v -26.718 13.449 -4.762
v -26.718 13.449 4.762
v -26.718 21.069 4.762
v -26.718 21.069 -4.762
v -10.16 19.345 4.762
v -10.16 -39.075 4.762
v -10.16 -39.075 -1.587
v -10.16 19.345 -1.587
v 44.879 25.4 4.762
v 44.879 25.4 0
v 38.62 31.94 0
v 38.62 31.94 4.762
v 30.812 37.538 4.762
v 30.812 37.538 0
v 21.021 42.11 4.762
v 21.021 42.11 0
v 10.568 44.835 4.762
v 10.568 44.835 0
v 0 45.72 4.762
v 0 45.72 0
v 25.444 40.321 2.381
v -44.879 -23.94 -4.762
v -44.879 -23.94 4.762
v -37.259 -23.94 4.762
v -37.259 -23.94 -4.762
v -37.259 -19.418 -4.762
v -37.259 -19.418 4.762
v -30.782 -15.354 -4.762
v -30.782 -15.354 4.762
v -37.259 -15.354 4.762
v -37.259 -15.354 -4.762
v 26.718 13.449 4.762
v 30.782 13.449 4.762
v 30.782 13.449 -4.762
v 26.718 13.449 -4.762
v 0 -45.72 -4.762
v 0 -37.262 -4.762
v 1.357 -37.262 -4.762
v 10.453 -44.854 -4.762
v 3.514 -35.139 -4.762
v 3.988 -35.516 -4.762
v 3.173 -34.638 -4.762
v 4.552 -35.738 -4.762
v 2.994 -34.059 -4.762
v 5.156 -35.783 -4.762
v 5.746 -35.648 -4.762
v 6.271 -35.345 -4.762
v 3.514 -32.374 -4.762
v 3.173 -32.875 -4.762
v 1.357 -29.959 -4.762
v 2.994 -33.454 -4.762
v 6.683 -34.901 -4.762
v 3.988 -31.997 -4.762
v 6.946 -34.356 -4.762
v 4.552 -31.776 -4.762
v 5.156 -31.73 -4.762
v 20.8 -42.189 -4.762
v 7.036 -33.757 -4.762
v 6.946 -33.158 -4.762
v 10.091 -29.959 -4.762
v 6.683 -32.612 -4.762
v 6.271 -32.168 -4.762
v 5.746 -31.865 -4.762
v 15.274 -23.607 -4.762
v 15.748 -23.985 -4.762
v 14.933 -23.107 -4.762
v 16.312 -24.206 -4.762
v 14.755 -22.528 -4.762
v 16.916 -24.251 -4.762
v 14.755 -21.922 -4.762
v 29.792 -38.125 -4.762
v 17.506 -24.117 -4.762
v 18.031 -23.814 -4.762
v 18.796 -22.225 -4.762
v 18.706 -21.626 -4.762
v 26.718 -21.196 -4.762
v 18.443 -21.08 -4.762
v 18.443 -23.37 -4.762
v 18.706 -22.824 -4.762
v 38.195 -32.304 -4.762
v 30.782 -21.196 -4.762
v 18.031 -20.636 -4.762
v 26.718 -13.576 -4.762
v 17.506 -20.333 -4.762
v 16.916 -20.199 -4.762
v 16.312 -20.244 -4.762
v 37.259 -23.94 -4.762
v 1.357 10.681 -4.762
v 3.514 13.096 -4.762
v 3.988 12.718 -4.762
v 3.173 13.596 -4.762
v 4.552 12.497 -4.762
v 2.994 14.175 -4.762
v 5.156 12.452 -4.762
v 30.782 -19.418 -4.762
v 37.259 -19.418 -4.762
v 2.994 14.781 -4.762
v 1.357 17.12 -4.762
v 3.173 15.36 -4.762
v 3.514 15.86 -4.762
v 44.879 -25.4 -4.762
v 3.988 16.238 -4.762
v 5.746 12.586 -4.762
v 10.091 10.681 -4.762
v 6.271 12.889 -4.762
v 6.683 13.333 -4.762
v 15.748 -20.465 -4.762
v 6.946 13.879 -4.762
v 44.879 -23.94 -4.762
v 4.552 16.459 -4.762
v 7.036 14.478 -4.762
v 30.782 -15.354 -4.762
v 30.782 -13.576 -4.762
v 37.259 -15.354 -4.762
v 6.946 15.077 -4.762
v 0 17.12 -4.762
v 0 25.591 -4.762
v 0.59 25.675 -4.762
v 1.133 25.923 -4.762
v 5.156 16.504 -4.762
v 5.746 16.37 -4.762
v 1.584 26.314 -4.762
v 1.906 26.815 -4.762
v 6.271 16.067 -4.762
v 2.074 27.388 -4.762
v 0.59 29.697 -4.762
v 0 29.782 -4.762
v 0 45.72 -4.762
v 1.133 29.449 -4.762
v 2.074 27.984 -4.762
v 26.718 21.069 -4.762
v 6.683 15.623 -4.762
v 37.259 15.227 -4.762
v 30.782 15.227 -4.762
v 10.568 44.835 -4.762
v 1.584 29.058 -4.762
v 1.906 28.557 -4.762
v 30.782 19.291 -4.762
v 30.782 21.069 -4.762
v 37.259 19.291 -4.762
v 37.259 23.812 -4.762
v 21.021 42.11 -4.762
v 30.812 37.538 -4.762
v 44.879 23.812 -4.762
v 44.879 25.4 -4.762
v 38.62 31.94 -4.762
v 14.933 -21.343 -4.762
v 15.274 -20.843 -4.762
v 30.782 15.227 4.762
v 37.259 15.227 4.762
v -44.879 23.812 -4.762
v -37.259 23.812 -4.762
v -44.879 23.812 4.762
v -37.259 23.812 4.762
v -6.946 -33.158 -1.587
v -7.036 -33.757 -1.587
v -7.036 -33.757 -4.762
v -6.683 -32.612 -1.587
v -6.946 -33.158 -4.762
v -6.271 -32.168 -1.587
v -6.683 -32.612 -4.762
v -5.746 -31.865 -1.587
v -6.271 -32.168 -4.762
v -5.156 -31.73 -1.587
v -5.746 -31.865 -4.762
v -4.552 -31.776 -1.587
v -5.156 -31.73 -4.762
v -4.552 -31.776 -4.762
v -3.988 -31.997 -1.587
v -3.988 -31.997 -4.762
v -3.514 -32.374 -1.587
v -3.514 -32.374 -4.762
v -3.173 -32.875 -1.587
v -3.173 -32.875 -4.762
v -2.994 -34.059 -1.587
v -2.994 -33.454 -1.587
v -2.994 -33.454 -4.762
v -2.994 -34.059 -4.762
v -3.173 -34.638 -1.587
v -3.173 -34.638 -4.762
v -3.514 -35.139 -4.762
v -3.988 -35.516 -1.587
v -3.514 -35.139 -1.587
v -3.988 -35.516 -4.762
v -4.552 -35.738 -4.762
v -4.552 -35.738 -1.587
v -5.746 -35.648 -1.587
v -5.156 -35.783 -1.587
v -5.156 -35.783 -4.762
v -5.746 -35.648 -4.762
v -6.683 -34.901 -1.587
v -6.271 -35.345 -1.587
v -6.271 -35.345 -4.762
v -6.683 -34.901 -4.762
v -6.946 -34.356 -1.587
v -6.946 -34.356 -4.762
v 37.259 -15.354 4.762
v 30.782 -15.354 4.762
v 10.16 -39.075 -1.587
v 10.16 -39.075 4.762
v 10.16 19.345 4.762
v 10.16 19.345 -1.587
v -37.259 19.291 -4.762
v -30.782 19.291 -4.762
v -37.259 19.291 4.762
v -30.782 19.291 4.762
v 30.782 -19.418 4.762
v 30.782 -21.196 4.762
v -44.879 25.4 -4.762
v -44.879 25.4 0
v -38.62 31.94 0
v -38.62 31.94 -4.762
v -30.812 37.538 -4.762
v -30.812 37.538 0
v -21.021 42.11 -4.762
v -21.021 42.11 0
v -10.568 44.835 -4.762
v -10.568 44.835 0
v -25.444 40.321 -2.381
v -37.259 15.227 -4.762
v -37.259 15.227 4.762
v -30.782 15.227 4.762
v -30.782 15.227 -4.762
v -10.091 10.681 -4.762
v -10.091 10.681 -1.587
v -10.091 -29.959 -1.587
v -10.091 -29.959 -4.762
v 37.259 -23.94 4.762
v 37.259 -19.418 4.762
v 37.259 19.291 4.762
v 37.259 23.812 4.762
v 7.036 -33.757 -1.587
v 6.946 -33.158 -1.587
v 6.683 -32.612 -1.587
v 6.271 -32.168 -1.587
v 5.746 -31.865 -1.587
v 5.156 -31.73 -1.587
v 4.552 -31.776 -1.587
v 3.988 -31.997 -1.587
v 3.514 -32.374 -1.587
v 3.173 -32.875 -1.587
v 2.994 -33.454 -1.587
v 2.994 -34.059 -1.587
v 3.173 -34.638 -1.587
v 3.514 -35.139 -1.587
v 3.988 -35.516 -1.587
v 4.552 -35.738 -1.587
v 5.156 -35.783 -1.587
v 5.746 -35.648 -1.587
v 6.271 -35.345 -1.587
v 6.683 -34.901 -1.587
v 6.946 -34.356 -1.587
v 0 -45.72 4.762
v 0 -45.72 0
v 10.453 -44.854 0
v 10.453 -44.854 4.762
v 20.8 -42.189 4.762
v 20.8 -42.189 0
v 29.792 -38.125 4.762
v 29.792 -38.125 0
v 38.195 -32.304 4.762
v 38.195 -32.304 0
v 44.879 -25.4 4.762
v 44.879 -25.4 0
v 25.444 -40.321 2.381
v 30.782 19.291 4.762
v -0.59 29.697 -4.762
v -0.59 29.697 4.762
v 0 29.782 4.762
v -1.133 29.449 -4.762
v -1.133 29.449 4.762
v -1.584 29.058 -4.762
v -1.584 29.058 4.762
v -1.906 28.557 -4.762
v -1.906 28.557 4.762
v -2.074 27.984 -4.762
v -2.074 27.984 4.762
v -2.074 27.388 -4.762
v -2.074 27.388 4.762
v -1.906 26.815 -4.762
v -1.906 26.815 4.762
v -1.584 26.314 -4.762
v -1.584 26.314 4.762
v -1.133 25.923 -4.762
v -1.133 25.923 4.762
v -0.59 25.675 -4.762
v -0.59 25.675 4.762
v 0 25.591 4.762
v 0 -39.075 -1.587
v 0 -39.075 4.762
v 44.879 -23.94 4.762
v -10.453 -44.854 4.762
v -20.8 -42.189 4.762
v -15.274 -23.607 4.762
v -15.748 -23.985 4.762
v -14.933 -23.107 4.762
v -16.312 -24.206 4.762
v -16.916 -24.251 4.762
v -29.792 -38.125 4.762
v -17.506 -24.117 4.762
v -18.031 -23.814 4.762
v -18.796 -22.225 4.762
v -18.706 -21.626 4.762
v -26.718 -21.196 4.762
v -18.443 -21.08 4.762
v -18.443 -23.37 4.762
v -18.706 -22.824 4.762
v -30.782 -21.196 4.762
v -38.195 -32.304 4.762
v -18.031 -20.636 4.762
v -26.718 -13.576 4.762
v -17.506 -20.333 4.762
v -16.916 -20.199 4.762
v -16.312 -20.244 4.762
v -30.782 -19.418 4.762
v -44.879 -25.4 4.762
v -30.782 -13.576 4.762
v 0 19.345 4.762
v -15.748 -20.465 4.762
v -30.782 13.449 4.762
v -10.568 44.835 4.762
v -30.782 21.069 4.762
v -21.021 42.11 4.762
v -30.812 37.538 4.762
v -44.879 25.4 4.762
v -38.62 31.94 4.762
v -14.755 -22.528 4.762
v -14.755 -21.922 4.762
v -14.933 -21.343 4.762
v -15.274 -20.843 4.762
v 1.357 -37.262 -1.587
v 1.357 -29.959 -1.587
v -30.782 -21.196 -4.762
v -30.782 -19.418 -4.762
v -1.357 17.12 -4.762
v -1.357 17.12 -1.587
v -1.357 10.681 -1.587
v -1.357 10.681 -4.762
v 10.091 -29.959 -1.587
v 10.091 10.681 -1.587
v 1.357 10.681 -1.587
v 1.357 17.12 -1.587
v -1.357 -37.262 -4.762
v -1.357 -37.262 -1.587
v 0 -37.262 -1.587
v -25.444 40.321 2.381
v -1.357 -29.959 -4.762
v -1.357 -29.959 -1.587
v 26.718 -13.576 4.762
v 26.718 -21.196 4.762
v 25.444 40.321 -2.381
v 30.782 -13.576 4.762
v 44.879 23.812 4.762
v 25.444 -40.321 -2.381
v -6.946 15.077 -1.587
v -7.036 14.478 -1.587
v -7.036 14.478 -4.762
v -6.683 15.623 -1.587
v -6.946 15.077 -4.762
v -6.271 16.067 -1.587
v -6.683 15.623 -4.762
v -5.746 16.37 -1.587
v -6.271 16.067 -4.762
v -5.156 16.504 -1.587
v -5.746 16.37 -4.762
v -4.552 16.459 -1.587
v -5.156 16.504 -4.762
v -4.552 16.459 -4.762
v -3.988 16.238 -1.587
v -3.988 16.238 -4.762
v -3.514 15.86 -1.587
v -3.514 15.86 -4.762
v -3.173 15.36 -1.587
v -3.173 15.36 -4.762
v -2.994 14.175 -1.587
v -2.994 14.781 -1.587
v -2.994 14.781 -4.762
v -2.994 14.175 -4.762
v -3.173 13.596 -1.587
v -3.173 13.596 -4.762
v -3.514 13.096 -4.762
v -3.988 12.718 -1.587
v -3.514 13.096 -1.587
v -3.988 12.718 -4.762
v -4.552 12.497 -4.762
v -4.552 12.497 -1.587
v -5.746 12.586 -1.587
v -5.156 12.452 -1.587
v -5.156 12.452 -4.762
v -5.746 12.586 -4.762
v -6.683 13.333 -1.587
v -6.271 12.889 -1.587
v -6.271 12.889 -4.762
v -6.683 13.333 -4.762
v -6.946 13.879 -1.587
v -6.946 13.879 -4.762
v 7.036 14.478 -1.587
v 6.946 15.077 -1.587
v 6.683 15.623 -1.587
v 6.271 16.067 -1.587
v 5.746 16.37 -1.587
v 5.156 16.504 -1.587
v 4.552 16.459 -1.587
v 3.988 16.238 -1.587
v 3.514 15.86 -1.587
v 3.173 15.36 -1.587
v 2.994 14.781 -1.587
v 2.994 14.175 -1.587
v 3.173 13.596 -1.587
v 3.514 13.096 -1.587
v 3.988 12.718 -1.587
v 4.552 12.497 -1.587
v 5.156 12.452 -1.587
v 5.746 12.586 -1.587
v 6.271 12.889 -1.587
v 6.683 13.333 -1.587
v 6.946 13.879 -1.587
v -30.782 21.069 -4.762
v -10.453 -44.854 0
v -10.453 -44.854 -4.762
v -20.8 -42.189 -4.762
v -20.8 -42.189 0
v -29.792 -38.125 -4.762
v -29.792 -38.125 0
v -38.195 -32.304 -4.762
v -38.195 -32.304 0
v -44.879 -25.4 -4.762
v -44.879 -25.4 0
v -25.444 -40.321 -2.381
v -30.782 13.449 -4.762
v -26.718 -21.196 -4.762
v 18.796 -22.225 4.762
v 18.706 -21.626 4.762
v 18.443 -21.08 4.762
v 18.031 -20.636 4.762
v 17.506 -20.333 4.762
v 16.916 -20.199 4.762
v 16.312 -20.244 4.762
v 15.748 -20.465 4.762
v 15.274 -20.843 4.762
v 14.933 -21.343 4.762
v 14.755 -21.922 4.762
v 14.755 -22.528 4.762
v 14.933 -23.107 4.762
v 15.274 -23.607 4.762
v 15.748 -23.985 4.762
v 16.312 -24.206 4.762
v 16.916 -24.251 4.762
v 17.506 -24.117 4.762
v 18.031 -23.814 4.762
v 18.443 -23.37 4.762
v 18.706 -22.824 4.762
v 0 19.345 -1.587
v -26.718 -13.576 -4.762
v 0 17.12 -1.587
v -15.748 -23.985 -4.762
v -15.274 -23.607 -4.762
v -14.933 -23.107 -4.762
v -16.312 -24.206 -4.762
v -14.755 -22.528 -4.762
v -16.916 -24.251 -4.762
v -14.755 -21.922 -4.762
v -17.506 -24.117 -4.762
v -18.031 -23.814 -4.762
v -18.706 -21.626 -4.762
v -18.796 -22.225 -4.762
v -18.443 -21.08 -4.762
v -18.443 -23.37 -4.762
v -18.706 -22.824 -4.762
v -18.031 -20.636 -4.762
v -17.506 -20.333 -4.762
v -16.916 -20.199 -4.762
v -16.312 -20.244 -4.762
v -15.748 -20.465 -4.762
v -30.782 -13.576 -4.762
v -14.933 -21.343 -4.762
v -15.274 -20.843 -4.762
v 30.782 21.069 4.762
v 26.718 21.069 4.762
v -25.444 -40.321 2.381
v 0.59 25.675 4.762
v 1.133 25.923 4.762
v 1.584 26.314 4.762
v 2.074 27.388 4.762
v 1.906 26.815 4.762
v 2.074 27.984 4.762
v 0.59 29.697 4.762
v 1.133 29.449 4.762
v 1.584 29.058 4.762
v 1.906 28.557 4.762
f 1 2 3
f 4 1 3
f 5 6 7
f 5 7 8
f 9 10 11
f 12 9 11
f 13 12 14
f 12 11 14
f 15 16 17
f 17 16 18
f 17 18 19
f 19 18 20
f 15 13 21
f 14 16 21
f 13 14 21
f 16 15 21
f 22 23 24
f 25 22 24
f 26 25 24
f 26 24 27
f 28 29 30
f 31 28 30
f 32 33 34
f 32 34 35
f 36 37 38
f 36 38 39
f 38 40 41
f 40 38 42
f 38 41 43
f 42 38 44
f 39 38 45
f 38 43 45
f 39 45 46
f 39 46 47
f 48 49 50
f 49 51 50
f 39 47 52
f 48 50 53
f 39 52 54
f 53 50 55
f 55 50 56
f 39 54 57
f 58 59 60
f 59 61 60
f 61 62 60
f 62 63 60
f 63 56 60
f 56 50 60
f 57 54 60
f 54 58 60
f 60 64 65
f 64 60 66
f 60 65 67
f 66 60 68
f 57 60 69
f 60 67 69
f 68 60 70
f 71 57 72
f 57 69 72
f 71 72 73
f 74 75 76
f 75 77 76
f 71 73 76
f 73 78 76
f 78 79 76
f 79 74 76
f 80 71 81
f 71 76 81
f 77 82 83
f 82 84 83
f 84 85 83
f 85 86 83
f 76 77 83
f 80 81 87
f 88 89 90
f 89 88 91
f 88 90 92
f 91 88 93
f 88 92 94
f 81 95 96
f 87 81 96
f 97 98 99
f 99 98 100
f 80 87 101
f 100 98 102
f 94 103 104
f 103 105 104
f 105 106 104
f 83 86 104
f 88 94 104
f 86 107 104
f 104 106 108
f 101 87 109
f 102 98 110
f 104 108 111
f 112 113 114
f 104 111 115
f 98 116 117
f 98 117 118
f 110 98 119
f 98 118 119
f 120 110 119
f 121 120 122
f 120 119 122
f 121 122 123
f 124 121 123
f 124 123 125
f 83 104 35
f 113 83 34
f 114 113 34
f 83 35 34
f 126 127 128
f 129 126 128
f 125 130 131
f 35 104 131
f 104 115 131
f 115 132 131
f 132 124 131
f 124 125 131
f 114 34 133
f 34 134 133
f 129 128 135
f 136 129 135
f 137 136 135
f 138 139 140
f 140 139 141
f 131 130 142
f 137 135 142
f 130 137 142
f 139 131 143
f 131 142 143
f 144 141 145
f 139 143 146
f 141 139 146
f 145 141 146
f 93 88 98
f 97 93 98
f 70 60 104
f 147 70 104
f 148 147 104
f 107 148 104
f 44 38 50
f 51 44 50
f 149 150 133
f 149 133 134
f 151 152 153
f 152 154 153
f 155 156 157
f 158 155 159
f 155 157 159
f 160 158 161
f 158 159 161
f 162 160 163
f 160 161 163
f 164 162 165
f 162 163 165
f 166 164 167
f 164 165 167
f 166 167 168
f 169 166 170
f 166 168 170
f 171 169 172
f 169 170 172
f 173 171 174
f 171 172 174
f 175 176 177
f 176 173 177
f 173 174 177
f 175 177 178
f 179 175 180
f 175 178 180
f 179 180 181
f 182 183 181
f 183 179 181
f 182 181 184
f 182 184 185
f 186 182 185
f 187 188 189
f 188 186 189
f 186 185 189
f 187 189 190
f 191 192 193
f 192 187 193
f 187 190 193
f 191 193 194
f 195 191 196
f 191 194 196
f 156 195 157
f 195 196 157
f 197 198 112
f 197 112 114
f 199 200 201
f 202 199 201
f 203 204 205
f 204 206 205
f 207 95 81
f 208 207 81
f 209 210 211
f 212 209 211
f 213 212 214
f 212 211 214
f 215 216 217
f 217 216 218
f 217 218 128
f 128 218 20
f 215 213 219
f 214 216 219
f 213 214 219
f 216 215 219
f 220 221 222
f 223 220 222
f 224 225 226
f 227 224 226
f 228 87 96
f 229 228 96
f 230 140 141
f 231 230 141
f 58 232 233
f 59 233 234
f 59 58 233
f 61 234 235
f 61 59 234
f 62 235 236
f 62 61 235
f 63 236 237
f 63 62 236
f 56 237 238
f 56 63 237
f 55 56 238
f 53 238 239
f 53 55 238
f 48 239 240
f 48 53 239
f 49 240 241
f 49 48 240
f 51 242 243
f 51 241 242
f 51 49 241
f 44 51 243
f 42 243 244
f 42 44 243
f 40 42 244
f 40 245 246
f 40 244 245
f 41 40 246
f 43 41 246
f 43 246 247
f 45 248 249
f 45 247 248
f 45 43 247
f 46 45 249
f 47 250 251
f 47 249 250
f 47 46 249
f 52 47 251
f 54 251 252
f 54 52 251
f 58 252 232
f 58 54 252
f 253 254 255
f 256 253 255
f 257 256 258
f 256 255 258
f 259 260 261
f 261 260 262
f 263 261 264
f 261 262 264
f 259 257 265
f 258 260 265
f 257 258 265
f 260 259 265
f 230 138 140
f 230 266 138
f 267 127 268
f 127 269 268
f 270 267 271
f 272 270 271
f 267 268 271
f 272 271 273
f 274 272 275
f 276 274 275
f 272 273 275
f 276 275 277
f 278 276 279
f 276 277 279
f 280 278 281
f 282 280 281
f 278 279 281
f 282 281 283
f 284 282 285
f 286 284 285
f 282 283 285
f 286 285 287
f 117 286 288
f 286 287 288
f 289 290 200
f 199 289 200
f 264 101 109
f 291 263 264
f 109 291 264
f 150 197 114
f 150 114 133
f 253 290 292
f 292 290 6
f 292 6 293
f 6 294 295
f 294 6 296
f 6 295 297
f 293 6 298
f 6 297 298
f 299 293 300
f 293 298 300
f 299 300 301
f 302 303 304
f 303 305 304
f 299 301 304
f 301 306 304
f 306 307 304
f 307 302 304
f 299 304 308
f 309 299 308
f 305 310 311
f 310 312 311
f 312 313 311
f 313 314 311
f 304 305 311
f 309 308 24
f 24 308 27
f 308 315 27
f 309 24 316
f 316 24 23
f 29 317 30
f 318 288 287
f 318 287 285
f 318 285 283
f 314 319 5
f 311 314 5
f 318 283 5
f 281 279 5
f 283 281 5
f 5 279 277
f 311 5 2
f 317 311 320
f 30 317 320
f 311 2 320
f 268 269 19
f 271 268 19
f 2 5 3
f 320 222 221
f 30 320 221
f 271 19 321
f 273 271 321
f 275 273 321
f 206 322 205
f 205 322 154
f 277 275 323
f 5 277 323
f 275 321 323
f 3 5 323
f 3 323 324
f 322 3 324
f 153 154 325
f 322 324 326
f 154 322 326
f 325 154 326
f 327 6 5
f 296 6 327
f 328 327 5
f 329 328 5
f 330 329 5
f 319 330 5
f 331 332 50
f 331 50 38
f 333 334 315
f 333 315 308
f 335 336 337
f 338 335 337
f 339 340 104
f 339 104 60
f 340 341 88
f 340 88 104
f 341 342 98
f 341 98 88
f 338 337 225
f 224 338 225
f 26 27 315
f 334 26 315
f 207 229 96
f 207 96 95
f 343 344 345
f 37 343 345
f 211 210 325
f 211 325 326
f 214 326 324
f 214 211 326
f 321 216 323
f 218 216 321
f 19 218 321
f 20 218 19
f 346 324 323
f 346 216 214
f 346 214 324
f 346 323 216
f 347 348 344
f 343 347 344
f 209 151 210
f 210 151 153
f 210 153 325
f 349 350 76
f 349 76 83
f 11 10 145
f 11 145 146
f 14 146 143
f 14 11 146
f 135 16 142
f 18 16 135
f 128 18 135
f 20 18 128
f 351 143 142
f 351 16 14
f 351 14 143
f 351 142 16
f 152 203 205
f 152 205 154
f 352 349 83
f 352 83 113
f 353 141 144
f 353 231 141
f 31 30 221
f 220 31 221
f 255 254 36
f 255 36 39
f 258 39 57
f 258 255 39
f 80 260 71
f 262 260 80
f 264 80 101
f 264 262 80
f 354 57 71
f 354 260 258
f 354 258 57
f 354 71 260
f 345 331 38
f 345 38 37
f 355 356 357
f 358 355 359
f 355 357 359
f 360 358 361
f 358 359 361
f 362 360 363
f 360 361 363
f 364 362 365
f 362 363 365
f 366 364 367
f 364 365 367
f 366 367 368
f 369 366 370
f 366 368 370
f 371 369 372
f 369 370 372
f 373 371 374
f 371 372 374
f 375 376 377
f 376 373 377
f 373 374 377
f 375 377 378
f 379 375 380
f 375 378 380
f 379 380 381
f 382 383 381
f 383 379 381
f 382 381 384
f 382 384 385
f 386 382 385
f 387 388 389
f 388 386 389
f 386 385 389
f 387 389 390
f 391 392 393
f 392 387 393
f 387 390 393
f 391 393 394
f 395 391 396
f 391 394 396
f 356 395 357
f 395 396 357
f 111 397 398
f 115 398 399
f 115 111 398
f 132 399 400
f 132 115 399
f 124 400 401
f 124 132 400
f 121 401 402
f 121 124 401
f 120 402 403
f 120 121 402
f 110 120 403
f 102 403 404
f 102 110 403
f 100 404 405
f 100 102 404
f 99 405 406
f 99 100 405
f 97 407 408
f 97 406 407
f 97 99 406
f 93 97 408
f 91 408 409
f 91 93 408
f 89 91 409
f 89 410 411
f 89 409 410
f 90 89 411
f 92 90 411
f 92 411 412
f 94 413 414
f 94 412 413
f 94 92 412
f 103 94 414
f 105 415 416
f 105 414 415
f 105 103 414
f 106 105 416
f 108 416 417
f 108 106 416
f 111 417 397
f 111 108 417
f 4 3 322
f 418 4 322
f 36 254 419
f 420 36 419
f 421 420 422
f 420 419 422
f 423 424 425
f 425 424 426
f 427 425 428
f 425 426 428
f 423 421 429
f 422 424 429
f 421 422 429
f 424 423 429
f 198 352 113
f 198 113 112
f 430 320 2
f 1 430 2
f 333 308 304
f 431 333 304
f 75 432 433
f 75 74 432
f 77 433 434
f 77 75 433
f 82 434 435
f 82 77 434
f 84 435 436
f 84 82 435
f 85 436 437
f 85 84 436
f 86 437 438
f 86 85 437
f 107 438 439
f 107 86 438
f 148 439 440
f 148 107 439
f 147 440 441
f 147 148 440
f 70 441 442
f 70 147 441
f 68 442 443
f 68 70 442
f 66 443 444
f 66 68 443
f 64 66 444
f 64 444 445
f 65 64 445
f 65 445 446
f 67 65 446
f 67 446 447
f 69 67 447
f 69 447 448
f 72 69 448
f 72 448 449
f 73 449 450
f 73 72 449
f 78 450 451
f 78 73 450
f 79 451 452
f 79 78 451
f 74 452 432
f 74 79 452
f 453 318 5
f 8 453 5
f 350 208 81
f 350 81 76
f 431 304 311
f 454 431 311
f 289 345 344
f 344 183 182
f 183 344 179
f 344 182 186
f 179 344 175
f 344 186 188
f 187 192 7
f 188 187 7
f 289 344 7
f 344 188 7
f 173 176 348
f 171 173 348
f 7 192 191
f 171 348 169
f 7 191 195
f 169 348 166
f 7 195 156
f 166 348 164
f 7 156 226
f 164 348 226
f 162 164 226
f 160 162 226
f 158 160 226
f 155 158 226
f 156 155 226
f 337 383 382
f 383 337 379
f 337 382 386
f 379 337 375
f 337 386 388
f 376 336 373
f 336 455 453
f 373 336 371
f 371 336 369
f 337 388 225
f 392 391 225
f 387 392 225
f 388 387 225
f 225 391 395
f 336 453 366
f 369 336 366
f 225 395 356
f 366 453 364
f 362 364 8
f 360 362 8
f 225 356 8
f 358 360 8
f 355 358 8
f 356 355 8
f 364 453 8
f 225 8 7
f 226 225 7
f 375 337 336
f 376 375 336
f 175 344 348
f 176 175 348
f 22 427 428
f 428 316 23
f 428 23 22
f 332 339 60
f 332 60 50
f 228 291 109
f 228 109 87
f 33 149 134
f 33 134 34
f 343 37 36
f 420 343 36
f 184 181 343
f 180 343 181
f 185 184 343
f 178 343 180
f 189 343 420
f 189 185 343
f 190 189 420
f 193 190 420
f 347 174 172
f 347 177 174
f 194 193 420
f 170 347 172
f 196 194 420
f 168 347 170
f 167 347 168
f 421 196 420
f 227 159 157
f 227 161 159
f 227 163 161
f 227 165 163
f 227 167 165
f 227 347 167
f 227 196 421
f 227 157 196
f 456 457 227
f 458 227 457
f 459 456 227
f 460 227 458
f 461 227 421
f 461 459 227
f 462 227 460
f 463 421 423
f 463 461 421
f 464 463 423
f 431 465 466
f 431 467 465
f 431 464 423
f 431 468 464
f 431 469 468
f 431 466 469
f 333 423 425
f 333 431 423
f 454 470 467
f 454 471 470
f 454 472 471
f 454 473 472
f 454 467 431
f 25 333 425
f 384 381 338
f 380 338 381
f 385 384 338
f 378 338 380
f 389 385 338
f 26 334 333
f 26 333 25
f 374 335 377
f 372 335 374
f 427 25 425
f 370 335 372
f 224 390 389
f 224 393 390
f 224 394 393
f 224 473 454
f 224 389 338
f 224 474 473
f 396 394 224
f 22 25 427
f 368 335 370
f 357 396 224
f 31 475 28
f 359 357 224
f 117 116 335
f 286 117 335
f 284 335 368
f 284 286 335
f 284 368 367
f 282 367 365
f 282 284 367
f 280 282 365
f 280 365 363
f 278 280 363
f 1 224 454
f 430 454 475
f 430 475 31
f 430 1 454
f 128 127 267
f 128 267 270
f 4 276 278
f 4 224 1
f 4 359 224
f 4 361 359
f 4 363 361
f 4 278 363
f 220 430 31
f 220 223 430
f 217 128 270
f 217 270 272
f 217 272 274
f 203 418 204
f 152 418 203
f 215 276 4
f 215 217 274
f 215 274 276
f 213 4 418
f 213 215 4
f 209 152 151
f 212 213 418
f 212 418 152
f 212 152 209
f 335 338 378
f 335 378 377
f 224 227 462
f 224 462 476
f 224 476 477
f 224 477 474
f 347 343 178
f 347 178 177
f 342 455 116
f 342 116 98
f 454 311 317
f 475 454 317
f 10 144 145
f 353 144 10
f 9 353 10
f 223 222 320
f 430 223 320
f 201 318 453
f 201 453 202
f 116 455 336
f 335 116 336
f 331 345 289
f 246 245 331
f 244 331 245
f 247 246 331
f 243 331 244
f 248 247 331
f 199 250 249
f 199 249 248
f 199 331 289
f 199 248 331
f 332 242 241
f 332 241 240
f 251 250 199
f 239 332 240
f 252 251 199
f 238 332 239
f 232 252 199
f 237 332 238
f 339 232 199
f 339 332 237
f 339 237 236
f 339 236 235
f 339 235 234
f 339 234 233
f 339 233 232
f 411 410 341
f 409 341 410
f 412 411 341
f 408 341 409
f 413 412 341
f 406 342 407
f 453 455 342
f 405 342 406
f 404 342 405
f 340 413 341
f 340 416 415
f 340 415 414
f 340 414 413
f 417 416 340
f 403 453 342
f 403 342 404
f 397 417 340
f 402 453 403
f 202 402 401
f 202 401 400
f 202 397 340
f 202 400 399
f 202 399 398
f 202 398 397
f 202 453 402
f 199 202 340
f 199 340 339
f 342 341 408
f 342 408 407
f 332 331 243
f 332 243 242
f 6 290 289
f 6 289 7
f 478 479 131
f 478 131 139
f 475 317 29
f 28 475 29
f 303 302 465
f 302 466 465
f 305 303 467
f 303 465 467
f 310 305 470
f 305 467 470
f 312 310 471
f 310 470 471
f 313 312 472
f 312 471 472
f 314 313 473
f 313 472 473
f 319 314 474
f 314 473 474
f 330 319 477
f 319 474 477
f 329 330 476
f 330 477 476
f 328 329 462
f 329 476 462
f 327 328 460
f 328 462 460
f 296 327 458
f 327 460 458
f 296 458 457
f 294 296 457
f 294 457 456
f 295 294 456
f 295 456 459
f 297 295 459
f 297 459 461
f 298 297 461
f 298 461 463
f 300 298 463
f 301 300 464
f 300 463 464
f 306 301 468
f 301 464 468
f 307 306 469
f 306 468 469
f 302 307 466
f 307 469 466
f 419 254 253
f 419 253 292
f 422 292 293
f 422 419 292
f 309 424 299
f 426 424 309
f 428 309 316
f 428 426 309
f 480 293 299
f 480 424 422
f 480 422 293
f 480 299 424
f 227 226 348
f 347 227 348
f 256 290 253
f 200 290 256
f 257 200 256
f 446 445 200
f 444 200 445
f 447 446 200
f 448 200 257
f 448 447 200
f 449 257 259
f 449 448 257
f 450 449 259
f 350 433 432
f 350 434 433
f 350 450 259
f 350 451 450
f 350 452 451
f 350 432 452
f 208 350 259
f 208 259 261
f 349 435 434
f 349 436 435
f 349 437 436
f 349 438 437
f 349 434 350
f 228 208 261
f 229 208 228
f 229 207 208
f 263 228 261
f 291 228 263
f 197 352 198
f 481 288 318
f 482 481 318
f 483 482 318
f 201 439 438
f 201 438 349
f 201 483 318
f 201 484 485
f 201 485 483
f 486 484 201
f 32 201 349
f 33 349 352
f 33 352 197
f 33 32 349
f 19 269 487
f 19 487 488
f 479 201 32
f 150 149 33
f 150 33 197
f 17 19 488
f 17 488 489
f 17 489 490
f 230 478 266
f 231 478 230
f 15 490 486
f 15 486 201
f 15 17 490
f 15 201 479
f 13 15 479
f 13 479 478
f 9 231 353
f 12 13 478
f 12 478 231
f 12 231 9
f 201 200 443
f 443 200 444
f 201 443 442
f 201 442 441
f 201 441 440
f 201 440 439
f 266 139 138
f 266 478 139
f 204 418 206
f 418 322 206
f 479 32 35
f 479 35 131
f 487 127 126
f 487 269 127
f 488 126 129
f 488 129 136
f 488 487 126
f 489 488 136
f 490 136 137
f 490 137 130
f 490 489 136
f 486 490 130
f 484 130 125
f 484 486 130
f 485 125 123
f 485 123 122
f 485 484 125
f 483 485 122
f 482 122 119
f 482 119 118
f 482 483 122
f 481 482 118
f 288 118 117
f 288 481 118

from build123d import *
from build123d import SkipClean  # not in build123d's __all__

# Parameters (mm, degrees)
F0_R     = 2.032
F1_DEPTH = 4.7625
F2_W     = 10.16
F2_H     = 58.42
F3_DEPTH = 6.35


with BuildPart() as f1:
    # F0 (on Top) → F1 (new body, symmetric)
    with BuildSketch(Plane.XY):
        with BuildLine():
            Line((0, -37.2616276145), (0, -45.72))
            add(Edge.make_bspline(
                [(0, -45.72), (28.8508510644, -45.72), (44.8791016558, -25.4)],
                knots=[1.5707963268, 1.5707963268, 1.5707963268, 2.5525616834, 2.5525616834, 2.5525616834], degree=2, weights=[1, 0.8819171037, 1]))
            Line((44.8791016558, -25.4), (44.8791016558, -23.9395))
            Line((44.8791016558, -23.9395), (37.2591016558, -23.9395))
            Line((37.2591016558, -23.9395), (37.2591016558, -19.4183))
            Line((37.2591016558, -19.4183), (30.7821016558, -19.4183))
            Line((30.7821016558, -19.4183), (30.7821016558, -21.1963))
            Line((30.7821016558, -21.1963), (26.7181016558, -21.1963))
            Line((26.7181016558, -21.1963), (26.7181016558, -13.5763))
            Line((26.7181016558, -13.5763), (30.7821016558, -13.5763))
            Line((30.7821016558, -13.5763), (30.7821016558, -15.3543))
            Line((30.7821016558, -15.3543), (37.2591016558, -15.3543))
            Line((37.2591016558, -15.3543), (37.2591016558, 15.2273))
            Line((37.2591016558, 15.2273), (30.7821016558, 15.2273))
            Line((30.7821016558, 15.2273), (30.7821016558, 13.4493))
            Line((30.7821016558, 13.4493), (26.7181016558, 13.4493))
            Line((26.7181016558, 13.4493), (26.7181016558, 21.0693))
            Line((26.7181016558, 21.0693), (30.7821016558, 21.0693))
            Line((30.7821016558, 21.0693), (30.7821016558, 19.2913))
            Line((30.7821016558, 19.2913), (37.2591016558, 19.2913))
            Line((37.2591016558, 19.2913), (37.2591016558, 23.8125))
            Line((37.2591016558, 23.8125), (44.8791016558, 23.8125))
            Line((44.8791016558, 23.8125), (44.8791016558, 25.4))
            add(Edge.make_bspline(
                [(44.8791016558, 25.4), (28.8508510644, 45.72), (0, 45.72)],
                knots=[3.7306236238, 3.7306236238, 3.7306236238, 4.7123889804, 4.7123889804, 4.7123889804], degree=2, weights=[1, 0.8819171037, 1]))
            Line((0, 45.72), (0, 29.7815))
            ThreePointArc((0, 29.7815), (2.0955, 27.686), (0, 25.5905))
            Line((0, 25.5905), (0, 17.1200428158))
            Line((0, 17.1200428158), (1.3565140544, 17.1200428158))
            Line((1.3565140544, 17.1200428158), (1.3565140544, 10.6807))
            Line((1.3565140544, 10.6807), (10.0905383006, 10.6807))
            Line((10.0905383006, 10.6807), (10.0905383006, -29.9593))
            Line((10.0905383006, -29.9593), (1.3565140544, -29.9593))
            Line((1.3565140544, -29.9593), (1.3565140544, -37.2616276145))
            Line((1.3565140544, -37.2616276145), (0, -37.2616276145))
        make_face()
        with Locations((5.0038, -33.7566)):
            Circle(F0_R, mode=Mode.SUBTRACT)
        with Locations((16.764, -22.225)):
            Circle(F0_R, mode=Mode.SUBTRACT)
        with Locations((5.0038, 14.478)):
            Circle(F0_R, mode=Mode.SUBTRACT)
    extrude(amount=F1_DEPTH, both=True)

    # F2 (on face) → F3 (cut)
    with BuildSketch(Plane.XY.offset(4.7625)):
        with Locations((5.08, -9.8651262736)):
            Rectangle(F2_W, F2_H)
    extrude(amount=-F3_DEPTH, mode=Mode.SUBTRACT)

    # F4: F1 across plane


with BuildPart() as f1_1:
    add(f1.part, clean=False)
    with SkipClean():  # cleaning this boolean's faces spoils the solid; the shape is the same uncleaned
        add(f1.part.mirror(Plane.YZ), clean=False)


solid = f1_1.part
